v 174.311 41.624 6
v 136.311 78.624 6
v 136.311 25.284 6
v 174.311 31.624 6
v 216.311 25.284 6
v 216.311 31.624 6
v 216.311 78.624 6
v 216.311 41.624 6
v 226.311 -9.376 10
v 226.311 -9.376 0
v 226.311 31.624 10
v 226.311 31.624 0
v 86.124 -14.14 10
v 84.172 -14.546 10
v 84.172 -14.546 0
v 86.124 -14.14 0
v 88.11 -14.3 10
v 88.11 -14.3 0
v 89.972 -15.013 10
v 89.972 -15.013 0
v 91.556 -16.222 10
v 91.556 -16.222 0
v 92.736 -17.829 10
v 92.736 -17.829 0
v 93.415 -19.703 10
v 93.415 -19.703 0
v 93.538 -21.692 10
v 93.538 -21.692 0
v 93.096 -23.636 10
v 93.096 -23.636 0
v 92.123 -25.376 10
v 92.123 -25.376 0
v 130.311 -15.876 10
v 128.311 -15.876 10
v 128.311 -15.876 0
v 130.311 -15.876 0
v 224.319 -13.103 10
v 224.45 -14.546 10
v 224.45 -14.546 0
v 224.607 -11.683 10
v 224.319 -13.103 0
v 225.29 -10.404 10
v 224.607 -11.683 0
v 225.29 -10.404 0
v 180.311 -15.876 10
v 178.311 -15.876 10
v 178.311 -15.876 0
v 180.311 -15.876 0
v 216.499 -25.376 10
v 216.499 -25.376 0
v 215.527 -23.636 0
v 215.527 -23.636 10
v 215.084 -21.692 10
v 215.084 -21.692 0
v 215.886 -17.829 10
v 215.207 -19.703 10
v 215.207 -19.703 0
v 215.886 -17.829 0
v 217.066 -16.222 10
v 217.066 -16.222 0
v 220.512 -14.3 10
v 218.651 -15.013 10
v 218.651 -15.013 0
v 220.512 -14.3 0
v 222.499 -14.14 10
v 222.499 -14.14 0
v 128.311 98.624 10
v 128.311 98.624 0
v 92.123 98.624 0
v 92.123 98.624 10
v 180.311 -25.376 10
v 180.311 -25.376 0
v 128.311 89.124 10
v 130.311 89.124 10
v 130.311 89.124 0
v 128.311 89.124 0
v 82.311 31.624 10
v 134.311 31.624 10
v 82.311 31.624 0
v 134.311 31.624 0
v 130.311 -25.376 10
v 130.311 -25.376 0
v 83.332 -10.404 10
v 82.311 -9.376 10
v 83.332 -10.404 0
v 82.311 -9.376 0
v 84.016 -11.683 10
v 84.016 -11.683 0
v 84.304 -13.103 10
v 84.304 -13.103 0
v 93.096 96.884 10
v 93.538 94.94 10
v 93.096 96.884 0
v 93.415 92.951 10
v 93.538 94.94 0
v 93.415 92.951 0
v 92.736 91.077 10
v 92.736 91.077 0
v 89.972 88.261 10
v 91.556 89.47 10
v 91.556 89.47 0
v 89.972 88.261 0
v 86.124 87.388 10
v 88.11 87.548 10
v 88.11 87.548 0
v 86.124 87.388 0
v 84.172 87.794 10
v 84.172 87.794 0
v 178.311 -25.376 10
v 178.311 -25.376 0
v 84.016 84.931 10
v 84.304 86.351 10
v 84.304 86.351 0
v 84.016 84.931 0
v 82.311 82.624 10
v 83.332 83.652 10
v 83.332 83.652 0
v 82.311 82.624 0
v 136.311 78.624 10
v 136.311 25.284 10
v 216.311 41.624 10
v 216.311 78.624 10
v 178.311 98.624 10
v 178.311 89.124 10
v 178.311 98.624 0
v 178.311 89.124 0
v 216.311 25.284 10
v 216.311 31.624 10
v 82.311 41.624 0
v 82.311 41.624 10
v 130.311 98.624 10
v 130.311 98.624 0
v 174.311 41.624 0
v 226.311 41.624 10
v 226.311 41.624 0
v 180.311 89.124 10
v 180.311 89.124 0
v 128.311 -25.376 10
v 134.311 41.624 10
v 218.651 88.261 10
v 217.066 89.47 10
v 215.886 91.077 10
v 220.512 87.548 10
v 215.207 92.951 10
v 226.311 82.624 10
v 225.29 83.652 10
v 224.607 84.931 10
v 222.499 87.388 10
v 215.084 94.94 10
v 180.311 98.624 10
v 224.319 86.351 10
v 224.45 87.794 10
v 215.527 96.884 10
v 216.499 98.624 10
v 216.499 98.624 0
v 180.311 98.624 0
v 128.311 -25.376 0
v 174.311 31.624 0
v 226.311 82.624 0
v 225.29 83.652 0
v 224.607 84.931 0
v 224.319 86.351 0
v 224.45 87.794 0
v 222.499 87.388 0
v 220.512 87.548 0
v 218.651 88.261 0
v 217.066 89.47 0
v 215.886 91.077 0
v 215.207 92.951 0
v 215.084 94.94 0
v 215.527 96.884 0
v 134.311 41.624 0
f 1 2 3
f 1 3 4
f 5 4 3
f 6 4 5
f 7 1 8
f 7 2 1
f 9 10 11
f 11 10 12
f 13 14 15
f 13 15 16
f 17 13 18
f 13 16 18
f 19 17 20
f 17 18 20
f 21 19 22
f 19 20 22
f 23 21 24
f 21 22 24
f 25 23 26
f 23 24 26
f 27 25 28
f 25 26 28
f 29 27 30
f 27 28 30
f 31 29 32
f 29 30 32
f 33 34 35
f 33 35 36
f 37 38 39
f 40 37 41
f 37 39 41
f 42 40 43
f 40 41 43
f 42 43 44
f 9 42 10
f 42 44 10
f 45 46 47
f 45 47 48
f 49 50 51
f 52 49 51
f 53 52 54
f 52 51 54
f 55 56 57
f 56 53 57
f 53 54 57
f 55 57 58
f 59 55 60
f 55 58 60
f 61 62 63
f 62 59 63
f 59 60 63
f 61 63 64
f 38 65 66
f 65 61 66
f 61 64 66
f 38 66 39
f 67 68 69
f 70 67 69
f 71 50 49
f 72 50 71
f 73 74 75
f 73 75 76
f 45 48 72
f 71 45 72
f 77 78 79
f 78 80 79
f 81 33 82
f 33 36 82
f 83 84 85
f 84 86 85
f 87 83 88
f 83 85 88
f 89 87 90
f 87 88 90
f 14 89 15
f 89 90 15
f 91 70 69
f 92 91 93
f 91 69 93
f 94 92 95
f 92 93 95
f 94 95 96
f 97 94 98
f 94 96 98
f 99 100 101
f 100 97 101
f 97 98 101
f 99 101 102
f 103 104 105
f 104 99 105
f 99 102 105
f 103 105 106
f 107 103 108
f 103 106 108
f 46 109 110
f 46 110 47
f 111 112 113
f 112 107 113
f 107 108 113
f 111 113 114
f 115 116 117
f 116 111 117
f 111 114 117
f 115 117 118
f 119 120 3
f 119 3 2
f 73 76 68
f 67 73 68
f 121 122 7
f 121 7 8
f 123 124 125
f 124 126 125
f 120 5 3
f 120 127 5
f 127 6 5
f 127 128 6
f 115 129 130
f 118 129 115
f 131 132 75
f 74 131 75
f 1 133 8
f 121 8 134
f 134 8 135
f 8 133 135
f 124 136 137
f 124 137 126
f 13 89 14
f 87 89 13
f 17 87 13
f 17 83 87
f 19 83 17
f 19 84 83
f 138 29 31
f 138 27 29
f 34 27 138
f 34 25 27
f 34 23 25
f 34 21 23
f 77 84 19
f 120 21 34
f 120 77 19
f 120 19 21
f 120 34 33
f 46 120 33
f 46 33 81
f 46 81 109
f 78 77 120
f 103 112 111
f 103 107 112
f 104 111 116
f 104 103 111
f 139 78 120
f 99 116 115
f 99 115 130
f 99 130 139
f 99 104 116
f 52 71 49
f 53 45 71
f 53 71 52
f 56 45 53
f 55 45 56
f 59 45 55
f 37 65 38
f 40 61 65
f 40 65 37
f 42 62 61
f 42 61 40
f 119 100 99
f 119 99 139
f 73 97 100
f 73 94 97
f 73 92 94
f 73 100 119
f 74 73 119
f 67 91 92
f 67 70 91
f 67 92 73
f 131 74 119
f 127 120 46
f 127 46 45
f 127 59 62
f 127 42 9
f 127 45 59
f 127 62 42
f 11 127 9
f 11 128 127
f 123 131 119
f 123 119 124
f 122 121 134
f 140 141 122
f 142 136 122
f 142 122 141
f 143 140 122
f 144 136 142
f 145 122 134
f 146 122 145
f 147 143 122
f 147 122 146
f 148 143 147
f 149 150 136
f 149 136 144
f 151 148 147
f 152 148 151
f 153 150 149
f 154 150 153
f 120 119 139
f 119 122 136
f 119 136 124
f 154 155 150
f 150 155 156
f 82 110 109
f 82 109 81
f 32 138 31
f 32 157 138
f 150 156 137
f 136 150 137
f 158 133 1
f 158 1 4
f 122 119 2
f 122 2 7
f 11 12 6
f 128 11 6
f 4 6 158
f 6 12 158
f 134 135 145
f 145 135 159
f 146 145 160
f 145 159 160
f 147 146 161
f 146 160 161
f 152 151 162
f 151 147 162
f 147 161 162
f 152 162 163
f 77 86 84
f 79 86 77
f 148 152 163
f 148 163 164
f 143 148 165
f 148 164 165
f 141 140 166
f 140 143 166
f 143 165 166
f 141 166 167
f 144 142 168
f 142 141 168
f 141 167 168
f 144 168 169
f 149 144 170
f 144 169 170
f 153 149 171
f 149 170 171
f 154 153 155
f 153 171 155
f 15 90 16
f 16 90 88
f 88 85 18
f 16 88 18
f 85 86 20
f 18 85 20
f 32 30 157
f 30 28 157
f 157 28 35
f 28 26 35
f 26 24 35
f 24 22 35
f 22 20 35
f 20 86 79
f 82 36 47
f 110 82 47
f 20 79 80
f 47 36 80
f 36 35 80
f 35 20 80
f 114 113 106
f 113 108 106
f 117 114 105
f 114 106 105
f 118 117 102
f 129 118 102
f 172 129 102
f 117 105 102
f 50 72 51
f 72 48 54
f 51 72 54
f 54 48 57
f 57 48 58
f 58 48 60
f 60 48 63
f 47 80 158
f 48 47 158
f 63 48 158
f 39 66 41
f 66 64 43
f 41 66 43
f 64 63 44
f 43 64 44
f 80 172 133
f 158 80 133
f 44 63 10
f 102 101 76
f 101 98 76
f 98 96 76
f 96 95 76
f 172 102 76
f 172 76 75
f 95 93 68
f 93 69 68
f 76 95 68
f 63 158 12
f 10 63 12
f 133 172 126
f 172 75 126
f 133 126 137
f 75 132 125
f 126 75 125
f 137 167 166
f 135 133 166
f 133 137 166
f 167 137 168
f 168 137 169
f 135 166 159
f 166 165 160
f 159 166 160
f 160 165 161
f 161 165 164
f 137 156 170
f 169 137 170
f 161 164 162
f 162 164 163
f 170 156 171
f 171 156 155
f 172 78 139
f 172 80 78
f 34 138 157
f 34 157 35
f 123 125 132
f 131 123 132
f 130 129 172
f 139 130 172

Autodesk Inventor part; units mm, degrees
ref_plane "YZ Plane" through (0, 0, 0) normal (1, 0, 0) x (0, 1, 0)
ref_plane "XZ Plane" through (0, 0, 0) normal (0, 1, 0) x (-1, 0, 0)
ref_plane "XY Plane" through (0, 0, 0) normal (0, 0, 1) x (1, 0, 0)
sketch "Эскиз1" plane through (0, 0, 0) normal (0, 0, 1) x (1, 0, 0)
  line L0 (174.3111, 41.624) -> (226.3111, 41.624) projected
  line L1 (134.3111, 31.624) -> (82.3111, 31.624) projected
  line L2 (174.3111, 41.624) -> (174.3111, 31.624) projected
  line L3 (149.3111, 46.624) -> (159.3111, 46.624) projected
  line L4 (149.3111, 46.624) -> (149.3111, 86.624) projected
  line L5 (149.3111, 86.624) -> (159.3111, 86.624) projected
  line L6 (159.3111, 86.624) -> (159.3111, 46.624) projected
  line L7 (134.3111, 31.624) -> (134.3111, 41.624) projected
  line L8 (226.3111, 31.624) -> (174.3111, 31.624) projected
  line L9 (82.3111, 41.624) -> (134.3111, 41.624) projected
  line L10 (226.3111, 41.624) -> (226.3111, 82.624) projected
  arc A0 (216.499, 98.624) -> (224.45, 87.7942) centre (222.0611, 94.374) ccw projected
  line L11 (216.499, 98.624) -> (180.3111, 98.624) projected
  line L12 (180.3111, 98.624) -> (180.3111, 89.124) projected
  line L13 (180.3111, 89.124) -> (178.3111, 89.124) projected
  line L14 (178.3111, 89.124) -> (178.3111, 98.624) projected
  line L15 (178.3111, 98.624) -> (130.3111, 98.624) projected
  line L16 (130.3111, 98.624) -> (130.3111, 89.124) projected
  line L17 (130.3111, 89.124) -> (128.3111, 89.124) projected
  line L18 (128.3111, 89.124) -> (128.3111, 98.624) projected
  line L19 (128.3111, 98.624) -> (92.1233, 98.624) projected
  arc A1 (84.1722, 87.7942) -> (92.1233, 98.624) centre (86.5611, 94.374) ccw projected
  line L20 (82.3111, -9.376) -> (82.3111, 31.624) projected
  arc A2 (92.1233, -25.376) -> (84.1722, -14.5463) centre (86.5611, -21.126) ccw projected
  line L21 (128.3111, -25.376) -> (92.1233, -25.376) projected
  line L22 (128.3111, -25.376) -> (128.3111, -15.876) projected
  line L23 (128.3111, -15.876) -> (130.3111, -15.876) projected
  line L24 (130.3111, -15.876) -> (130.3111, -25.376) projected
  line L25 (178.3111, -25.376) -> (130.3111, -25.376) projected
  line L26 (178.3111, -25.376) -> (178.3111, -15.876) projected
  line L27 (178.3111, -15.876) -> (180.3111, -15.876) projected
  line L28 (180.3111, -15.876) -> (180.3111, -25.376) projected
  line L29 (216.499, -25.376) -> (180.3111, -25.376) projected
  arc A3 (224.45, -14.5463) -> (216.499, -25.376) centre (222.0611, -21.126) ccw projected
  line L30 (159.3111, 26.624) -> (149.3111, 26.624) projected
  line L31 (159.3111, 26.624) -> (159.3111, -13.376) projected
  line L32 (159.3111, -13.376) -> (149.3111, -13.376) projected
  line L33 (149.3111, -13.376) -> (149.3111, 26.624) projected
  arc A4 (224.45, 87.7942) -> (226.3111, 82.624) centre (229.3111, 86.624) ccw projected
  arc A5 (84.1722, -14.5463) -> (82.3111, -9.376) centre (79.3111, -13.376) ccw projected
  arc A6 (82.3111, 82.624) -> (84.1722, 87.7942) centre (79.3111, 86.624) ccw projected
  arc A7 (226.3111, -9.376) -> (224.45, -14.5463) centre (229.3111, -13.376) ccw projected
  line L34 (226.3111, -9.376) -> (226.3111, 31.624) projected
  line L35 (82.3111, 41.624) -> (82.3111, 82.624) projected
  point P0 (0, 0)
  point P1 (179.3111, -15.876)
  point P2 (129.3111, -15.876)
  point P3 (70.835, 120.6534)
  point P4 (129.3111, 89.124)
  point P5 (179.3111, 89.124)
  point P6 (242.2845, 49.4059)
  point P7 (79.3111, -13.376)
  point P8 (229.3111, -13.376)
extrude "Выдавливание1" add sketch "Эскиз1" along normal blind 10 contours L2 L8 L34 A7 A3 L29 L28 L27 L26 L25 L24 L23 L22 L21 A2 A5 L20 L1 L7 L9 L35 A6 A1 L19 L18 L17 L16 L15 L14 L13 L12 L11 A0 A4 L10 L0 | L4 L5 L6 L3 | L31 L32 L33 L30
sketch "Эскиз2" plane through (0, 0, 10) normal (0, 0, 1) x (1, 0, 0)
  line L0 (216.3111, 25.284) -> (136.3111, 25.284)
  line L1 (136.3111, 25.284) -> (136.3111, 78.624)
  line L2 (136.3111, 78.624) -> (216.3111, 78.624)
  line L3 (216.3111, 78.624) -> (216.3111, 25.284)
  line L4 (226.3111, 41.624) -> (226.3111, 82.624) projected
  line L5 (216.499, 98.624) -> (180.3111, 98.624) projected
  point P0 (0, 0)
  point P1 (231.3111, -8.7934)
  point P2 (231.3111, 82.0414)
  point P3 (226.3111, 82.624)
  dimension "d14" = 80
  dimension "d15" = 53.34
  dimension "d58" = 20
  dimension "d59" = 10
extrude "Выдавливание2" cut sketch "Эскиз2" against normal blind 4
properties part number "Каркас"
